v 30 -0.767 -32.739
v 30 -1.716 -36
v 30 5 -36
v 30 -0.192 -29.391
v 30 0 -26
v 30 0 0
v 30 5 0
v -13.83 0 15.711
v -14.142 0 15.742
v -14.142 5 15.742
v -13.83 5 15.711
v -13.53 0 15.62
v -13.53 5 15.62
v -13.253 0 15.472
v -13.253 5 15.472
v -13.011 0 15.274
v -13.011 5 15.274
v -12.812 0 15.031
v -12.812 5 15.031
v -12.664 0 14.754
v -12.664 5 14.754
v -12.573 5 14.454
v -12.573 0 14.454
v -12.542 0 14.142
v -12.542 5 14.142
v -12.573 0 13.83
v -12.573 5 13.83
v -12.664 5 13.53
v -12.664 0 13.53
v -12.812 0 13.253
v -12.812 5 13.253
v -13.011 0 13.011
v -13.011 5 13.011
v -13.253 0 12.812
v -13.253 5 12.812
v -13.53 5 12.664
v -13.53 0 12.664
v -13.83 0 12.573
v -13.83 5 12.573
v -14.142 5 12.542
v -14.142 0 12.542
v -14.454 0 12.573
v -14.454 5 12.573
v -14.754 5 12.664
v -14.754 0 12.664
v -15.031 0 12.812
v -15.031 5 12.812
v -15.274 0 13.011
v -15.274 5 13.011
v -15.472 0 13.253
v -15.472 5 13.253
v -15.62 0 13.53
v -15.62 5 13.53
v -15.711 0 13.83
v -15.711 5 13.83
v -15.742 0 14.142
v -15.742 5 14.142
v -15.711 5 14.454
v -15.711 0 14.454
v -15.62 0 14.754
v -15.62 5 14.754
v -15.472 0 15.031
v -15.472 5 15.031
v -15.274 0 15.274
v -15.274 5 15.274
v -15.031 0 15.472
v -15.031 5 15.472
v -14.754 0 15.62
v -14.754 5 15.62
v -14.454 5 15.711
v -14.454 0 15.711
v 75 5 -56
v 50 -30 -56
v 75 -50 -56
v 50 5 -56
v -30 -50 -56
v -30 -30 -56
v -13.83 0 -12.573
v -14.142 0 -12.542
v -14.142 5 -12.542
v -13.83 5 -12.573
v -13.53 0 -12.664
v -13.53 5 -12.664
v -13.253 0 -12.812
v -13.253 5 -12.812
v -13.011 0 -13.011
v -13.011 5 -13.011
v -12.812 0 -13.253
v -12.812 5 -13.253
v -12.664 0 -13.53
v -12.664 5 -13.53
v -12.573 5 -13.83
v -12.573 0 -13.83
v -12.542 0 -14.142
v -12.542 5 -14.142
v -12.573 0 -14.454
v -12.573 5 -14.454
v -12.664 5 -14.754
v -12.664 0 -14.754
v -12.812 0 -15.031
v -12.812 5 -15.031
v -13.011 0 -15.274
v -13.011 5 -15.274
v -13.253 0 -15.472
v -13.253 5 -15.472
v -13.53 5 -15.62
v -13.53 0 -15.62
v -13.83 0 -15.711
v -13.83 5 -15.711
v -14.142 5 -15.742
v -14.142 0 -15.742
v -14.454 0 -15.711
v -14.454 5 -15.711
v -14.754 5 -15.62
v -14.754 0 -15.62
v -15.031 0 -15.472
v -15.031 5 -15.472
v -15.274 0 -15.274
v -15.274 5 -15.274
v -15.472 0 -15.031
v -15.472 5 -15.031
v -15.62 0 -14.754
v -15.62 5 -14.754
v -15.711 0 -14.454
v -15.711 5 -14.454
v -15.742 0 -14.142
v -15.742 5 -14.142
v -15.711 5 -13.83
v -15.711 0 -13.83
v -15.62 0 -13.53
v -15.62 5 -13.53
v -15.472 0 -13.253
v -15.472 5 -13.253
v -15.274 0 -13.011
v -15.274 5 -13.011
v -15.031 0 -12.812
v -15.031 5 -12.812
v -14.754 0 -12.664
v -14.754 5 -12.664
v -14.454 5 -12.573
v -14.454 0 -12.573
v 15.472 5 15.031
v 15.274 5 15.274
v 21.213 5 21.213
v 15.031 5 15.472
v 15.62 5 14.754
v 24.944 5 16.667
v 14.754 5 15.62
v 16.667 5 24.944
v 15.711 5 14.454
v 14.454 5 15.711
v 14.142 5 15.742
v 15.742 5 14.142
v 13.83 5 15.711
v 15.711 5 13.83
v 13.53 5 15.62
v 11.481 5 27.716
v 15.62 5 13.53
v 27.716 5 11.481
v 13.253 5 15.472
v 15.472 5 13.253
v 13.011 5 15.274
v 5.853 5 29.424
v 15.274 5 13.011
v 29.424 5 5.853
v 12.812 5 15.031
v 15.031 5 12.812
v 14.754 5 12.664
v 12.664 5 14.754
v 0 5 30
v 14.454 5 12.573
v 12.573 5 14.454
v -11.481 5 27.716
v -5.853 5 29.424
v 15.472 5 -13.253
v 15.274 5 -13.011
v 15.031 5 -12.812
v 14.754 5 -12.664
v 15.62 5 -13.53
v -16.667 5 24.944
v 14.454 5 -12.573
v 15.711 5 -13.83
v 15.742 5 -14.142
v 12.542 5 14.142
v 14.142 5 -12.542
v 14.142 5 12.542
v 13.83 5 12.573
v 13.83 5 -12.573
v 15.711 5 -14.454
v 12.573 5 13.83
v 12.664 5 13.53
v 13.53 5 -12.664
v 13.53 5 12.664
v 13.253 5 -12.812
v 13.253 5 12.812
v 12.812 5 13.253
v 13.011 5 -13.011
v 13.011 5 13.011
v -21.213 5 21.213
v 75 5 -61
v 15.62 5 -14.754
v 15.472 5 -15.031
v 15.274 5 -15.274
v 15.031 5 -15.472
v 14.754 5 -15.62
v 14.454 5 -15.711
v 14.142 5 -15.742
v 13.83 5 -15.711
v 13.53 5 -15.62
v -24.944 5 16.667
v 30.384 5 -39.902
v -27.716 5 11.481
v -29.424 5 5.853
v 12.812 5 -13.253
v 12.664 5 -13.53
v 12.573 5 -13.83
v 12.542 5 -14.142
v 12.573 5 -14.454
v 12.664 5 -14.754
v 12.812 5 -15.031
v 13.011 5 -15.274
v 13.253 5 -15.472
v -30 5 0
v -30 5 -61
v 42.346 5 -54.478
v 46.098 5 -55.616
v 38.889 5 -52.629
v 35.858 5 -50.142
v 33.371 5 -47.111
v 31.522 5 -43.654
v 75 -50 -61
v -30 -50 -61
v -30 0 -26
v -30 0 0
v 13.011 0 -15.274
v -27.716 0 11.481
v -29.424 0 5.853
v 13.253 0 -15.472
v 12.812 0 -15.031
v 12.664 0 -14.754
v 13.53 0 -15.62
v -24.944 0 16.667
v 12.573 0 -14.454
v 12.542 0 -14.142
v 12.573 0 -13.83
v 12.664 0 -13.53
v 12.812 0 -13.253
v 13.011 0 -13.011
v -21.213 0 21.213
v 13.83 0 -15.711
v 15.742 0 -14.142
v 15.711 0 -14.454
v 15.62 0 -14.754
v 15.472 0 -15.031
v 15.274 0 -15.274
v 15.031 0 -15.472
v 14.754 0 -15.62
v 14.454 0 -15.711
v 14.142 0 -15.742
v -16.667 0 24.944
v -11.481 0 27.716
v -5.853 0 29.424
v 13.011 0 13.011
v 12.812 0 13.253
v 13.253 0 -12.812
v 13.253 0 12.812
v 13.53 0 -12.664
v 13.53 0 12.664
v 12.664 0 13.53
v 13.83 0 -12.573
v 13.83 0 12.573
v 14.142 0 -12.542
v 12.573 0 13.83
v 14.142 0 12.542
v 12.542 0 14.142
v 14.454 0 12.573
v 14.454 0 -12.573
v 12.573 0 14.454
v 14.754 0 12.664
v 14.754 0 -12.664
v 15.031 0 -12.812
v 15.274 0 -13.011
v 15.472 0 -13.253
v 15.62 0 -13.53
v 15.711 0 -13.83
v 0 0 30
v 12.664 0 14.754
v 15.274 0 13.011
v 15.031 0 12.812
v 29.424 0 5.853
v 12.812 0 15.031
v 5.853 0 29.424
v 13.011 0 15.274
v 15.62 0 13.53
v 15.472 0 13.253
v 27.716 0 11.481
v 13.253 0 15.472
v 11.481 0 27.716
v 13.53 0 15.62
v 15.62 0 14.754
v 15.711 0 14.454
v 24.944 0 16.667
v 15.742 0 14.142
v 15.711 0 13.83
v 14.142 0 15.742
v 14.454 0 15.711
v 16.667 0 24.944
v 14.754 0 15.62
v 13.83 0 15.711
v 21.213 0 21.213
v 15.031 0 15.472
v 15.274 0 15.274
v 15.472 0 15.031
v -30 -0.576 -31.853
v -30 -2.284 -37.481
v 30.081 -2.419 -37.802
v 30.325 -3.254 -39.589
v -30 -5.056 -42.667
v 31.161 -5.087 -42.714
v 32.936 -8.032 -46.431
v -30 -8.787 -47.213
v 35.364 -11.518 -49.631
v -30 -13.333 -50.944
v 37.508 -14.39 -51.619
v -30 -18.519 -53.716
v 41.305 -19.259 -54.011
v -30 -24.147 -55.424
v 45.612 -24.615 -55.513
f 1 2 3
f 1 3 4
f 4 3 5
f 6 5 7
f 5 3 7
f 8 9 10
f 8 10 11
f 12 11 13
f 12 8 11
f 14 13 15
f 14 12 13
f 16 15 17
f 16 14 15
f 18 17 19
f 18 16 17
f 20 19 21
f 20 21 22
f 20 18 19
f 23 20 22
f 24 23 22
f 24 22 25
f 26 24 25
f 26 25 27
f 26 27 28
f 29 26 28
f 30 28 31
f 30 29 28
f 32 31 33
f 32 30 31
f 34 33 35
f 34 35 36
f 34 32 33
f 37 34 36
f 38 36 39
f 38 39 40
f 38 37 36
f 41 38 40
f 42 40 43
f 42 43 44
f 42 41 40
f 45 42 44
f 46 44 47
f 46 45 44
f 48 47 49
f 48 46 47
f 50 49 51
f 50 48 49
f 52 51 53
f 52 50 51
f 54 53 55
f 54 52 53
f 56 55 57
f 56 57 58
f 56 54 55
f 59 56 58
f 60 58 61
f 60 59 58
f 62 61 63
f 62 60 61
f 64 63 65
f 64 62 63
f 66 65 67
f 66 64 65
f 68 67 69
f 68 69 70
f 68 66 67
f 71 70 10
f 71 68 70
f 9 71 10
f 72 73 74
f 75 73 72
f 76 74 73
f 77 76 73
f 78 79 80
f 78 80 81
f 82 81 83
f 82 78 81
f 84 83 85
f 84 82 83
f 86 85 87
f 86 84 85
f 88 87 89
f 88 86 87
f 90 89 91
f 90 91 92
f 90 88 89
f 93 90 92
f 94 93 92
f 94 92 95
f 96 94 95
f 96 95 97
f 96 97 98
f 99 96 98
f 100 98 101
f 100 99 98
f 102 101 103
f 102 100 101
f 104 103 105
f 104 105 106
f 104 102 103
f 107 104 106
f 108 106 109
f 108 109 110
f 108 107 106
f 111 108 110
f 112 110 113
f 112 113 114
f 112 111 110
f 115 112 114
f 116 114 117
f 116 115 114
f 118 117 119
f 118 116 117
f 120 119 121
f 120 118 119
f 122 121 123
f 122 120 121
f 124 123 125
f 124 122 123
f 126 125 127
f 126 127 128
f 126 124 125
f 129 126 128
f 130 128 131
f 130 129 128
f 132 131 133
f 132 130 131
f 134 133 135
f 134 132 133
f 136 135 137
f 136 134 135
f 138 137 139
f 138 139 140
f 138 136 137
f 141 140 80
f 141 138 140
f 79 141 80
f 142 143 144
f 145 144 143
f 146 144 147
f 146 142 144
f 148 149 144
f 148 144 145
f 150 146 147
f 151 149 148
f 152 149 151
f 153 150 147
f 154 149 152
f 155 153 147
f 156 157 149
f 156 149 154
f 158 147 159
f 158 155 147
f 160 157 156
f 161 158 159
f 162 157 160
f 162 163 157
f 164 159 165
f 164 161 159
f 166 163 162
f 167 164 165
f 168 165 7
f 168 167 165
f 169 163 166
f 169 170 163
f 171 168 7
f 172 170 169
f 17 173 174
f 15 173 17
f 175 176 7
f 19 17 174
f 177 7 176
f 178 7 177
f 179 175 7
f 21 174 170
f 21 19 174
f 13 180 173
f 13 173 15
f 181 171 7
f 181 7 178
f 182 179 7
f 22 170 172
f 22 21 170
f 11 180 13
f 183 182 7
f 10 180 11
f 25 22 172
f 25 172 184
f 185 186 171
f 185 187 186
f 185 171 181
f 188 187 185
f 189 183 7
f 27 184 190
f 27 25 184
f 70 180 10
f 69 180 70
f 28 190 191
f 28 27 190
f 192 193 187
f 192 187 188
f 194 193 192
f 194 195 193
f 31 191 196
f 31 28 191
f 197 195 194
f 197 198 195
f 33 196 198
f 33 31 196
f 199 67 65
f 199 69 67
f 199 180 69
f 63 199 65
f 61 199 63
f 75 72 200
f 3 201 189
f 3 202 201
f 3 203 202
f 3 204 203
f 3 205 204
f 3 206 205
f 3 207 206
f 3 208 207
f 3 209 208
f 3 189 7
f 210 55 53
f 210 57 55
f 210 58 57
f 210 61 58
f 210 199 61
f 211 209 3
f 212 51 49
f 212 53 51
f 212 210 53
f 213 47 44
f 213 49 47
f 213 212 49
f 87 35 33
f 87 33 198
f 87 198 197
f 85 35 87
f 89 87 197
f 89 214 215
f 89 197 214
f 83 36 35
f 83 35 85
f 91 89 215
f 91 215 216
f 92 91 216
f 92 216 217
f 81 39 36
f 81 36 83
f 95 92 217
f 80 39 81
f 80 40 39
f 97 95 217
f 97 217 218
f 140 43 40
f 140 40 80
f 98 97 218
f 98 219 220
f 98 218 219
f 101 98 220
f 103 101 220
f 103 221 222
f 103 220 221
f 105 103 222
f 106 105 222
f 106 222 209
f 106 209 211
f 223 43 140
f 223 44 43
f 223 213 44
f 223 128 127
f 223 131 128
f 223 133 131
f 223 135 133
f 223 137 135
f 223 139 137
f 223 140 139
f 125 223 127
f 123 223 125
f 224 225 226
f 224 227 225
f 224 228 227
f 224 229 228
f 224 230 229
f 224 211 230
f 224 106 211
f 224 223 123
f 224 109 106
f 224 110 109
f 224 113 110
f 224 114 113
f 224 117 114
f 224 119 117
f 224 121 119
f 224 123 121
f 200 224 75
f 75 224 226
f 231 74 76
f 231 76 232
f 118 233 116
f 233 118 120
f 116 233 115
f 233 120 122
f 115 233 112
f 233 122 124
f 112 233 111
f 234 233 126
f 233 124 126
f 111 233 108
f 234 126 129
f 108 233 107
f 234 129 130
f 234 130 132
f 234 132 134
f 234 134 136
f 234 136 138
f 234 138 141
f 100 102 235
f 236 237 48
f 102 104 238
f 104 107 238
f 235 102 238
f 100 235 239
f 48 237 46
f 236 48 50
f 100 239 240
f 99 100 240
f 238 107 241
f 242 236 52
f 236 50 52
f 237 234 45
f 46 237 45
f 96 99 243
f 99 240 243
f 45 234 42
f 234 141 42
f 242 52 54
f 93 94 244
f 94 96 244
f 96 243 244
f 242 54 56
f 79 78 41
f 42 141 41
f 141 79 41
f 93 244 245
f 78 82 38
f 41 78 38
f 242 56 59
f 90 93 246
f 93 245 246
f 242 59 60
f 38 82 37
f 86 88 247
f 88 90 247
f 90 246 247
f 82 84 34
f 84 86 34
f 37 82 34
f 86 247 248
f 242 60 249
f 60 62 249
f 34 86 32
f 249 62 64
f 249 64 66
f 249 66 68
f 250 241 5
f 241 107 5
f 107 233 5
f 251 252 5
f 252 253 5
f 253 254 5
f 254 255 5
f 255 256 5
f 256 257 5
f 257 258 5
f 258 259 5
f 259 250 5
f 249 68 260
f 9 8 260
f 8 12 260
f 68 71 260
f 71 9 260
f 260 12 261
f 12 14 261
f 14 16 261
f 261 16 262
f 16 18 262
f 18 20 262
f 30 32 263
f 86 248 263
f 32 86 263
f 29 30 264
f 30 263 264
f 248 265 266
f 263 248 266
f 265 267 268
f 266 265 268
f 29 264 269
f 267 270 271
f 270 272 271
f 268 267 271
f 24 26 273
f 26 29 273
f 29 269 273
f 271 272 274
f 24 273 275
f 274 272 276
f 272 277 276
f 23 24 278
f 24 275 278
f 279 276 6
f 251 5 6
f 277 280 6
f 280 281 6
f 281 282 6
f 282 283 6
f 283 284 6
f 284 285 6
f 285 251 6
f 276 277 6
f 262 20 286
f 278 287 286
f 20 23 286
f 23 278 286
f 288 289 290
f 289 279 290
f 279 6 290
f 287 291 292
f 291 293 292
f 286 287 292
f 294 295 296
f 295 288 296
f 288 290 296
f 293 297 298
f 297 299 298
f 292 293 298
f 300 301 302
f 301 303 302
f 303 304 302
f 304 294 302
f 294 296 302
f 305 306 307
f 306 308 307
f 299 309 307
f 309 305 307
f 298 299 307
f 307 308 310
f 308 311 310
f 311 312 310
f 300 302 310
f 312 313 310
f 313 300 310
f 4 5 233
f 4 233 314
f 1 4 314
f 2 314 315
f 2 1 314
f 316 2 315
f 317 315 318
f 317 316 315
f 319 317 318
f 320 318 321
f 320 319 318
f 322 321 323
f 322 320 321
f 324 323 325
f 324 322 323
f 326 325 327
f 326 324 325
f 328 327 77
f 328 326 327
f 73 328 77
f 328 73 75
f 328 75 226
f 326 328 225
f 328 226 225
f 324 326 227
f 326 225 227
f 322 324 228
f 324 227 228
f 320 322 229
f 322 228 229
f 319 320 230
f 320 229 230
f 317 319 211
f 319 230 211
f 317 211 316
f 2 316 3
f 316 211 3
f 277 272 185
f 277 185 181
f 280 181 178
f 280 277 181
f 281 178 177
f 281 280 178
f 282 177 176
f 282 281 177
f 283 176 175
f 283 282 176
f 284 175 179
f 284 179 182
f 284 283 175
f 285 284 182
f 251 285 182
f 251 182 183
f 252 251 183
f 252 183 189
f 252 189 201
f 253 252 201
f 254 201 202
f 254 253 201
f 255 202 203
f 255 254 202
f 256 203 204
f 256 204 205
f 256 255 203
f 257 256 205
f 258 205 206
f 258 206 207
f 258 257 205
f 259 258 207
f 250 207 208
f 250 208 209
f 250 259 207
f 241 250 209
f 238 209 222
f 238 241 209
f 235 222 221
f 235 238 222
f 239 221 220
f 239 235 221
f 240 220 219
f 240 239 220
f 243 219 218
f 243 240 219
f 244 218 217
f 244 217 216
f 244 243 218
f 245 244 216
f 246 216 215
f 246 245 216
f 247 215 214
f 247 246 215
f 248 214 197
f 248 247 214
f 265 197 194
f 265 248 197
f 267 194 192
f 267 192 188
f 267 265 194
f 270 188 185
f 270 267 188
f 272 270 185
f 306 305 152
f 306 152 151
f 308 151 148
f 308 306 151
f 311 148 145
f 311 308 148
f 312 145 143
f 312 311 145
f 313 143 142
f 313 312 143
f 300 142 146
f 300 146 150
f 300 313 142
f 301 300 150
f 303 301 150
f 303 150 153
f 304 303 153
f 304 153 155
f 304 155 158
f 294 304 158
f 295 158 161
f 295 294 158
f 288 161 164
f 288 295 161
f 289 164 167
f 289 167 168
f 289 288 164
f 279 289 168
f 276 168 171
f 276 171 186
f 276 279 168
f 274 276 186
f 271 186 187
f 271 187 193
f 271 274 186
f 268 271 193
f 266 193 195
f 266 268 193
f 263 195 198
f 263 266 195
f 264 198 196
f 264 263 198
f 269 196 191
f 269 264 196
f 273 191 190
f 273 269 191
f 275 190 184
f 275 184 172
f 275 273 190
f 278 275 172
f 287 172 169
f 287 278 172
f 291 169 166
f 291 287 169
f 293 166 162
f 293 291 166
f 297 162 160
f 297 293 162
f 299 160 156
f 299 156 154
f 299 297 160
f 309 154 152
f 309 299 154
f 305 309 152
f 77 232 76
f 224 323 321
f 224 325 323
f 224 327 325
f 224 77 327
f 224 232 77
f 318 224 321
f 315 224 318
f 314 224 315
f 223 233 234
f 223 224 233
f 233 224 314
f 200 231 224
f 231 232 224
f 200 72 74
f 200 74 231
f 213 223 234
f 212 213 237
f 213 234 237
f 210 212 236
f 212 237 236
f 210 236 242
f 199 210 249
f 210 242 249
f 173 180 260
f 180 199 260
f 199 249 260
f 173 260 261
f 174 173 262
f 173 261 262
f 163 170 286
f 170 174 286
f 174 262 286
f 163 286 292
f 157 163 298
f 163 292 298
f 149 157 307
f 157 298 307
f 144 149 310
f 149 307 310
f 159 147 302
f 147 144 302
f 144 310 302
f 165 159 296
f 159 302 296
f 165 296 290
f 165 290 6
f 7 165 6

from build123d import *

# Parameters (mm, degrees)
SKETCH1_R           = 30
SKETCH1_R_2         = 1.6
BOSS_EXTRUDE1_DEPTH = 5
BOSS_EXTRUDE2_DEPTH = 5
SKETCH3_W           = 60
SKETCH3_H           = 5
BOSS_EXTRUDE3_DEPTH = 50
FILLET1_R           = 30
SKETCH4_W           = 5
SKETCH4_H           = 55
BOSS_EXTRUDE4_DEPTH = 45
FILLET2_R           = 20


with BuildPart() as part:
    # Sketch1 → Boss-Extrude1 (new body)
    with BuildSketch(Plane(origin=(0, 0, 0), x_dir=(1, 0, 0), z_dir=(0, 1, 0))):
        with Locations(Location((0, 0, 0), (0, 0, 270))):
            Circle(SKETCH1_R)
        with Locations(Location((14.142135624, 14.142135624, 0), (0, 0, 270))):
            Circle(SKETCH1_R_2, mode=Mode.SUBTRACT)
        with Locations(Location((-14.142135624, 14.142135624, 0), (0, 0, 270))):
            Circle(SKETCH1_R_2, mode=Mode.SUBTRACT)
        with Locations(Location((-14.142135624, -14.142135624, 0), (0, 0, 270))):
            Circle(SKETCH1_R_2, mode=Mode.SUBTRACT)
        with Locations(Location((14.142135624, -14.142135624, 0), (0, 0, 270))):
            Circle(SKETCH1_R_2, mode=Mode.SUBTRACT)
    extrude(amount=BOSS_EXTRUDE1_DEPTH)

    # Sketch2 → Boss-Extrude2 (add)
    with BuildSketch(Plane.XZ):
        with BuildLine():
            Line((-30, -61), (30, -61))
            Line((30, -61), (30, 0))
            ThreePointArc((30, 0), (0, -30), (-30, 0))
            Line((-30, 0), (-30, -61))
        make_face()
    extrude(amount=-BOSS_EXTRUDE2_DEPTH)

    # Sketch3 → Boss-Extrude3 (add)
    with BuildSketch(Plane.XZ):
        with Locations((0, -58.5)):
            Rectangle(SKETCH3_W, SKETCH3_H)
    extrude(amount=BOSS_EXTRUDE3_DEPTH)

    # Fillet1
    fillet1_edges = [part.edges().sort_by_distance(p)[0] for p in [
        (0, 0, -56),
    ]]
    fillet(fillet1_edges, radius=FILLET1_R)

    # Sketch4 → Boss-Extrude4 (add)
    with BuildSketch(Plane(origin=(30, 0, 0), x_dir=(0, 0, -1), z_dir=(1, 0, 0))):
        with Locations((58.5, -22.5)):
            Rectangle(SKETCH4_W, SKETCH4_H)
    extrude(amount=BOSS_EXTRUDE4_DEPTH)

    # Fillet2
    fillet2_edges = [part.edges().sort_by_distance(p)[0] for p in [
        (30, -12.5, -56),
    ]]
    fillet(fillet2_edges, radius=FILLET2_R)


solid = part.part
